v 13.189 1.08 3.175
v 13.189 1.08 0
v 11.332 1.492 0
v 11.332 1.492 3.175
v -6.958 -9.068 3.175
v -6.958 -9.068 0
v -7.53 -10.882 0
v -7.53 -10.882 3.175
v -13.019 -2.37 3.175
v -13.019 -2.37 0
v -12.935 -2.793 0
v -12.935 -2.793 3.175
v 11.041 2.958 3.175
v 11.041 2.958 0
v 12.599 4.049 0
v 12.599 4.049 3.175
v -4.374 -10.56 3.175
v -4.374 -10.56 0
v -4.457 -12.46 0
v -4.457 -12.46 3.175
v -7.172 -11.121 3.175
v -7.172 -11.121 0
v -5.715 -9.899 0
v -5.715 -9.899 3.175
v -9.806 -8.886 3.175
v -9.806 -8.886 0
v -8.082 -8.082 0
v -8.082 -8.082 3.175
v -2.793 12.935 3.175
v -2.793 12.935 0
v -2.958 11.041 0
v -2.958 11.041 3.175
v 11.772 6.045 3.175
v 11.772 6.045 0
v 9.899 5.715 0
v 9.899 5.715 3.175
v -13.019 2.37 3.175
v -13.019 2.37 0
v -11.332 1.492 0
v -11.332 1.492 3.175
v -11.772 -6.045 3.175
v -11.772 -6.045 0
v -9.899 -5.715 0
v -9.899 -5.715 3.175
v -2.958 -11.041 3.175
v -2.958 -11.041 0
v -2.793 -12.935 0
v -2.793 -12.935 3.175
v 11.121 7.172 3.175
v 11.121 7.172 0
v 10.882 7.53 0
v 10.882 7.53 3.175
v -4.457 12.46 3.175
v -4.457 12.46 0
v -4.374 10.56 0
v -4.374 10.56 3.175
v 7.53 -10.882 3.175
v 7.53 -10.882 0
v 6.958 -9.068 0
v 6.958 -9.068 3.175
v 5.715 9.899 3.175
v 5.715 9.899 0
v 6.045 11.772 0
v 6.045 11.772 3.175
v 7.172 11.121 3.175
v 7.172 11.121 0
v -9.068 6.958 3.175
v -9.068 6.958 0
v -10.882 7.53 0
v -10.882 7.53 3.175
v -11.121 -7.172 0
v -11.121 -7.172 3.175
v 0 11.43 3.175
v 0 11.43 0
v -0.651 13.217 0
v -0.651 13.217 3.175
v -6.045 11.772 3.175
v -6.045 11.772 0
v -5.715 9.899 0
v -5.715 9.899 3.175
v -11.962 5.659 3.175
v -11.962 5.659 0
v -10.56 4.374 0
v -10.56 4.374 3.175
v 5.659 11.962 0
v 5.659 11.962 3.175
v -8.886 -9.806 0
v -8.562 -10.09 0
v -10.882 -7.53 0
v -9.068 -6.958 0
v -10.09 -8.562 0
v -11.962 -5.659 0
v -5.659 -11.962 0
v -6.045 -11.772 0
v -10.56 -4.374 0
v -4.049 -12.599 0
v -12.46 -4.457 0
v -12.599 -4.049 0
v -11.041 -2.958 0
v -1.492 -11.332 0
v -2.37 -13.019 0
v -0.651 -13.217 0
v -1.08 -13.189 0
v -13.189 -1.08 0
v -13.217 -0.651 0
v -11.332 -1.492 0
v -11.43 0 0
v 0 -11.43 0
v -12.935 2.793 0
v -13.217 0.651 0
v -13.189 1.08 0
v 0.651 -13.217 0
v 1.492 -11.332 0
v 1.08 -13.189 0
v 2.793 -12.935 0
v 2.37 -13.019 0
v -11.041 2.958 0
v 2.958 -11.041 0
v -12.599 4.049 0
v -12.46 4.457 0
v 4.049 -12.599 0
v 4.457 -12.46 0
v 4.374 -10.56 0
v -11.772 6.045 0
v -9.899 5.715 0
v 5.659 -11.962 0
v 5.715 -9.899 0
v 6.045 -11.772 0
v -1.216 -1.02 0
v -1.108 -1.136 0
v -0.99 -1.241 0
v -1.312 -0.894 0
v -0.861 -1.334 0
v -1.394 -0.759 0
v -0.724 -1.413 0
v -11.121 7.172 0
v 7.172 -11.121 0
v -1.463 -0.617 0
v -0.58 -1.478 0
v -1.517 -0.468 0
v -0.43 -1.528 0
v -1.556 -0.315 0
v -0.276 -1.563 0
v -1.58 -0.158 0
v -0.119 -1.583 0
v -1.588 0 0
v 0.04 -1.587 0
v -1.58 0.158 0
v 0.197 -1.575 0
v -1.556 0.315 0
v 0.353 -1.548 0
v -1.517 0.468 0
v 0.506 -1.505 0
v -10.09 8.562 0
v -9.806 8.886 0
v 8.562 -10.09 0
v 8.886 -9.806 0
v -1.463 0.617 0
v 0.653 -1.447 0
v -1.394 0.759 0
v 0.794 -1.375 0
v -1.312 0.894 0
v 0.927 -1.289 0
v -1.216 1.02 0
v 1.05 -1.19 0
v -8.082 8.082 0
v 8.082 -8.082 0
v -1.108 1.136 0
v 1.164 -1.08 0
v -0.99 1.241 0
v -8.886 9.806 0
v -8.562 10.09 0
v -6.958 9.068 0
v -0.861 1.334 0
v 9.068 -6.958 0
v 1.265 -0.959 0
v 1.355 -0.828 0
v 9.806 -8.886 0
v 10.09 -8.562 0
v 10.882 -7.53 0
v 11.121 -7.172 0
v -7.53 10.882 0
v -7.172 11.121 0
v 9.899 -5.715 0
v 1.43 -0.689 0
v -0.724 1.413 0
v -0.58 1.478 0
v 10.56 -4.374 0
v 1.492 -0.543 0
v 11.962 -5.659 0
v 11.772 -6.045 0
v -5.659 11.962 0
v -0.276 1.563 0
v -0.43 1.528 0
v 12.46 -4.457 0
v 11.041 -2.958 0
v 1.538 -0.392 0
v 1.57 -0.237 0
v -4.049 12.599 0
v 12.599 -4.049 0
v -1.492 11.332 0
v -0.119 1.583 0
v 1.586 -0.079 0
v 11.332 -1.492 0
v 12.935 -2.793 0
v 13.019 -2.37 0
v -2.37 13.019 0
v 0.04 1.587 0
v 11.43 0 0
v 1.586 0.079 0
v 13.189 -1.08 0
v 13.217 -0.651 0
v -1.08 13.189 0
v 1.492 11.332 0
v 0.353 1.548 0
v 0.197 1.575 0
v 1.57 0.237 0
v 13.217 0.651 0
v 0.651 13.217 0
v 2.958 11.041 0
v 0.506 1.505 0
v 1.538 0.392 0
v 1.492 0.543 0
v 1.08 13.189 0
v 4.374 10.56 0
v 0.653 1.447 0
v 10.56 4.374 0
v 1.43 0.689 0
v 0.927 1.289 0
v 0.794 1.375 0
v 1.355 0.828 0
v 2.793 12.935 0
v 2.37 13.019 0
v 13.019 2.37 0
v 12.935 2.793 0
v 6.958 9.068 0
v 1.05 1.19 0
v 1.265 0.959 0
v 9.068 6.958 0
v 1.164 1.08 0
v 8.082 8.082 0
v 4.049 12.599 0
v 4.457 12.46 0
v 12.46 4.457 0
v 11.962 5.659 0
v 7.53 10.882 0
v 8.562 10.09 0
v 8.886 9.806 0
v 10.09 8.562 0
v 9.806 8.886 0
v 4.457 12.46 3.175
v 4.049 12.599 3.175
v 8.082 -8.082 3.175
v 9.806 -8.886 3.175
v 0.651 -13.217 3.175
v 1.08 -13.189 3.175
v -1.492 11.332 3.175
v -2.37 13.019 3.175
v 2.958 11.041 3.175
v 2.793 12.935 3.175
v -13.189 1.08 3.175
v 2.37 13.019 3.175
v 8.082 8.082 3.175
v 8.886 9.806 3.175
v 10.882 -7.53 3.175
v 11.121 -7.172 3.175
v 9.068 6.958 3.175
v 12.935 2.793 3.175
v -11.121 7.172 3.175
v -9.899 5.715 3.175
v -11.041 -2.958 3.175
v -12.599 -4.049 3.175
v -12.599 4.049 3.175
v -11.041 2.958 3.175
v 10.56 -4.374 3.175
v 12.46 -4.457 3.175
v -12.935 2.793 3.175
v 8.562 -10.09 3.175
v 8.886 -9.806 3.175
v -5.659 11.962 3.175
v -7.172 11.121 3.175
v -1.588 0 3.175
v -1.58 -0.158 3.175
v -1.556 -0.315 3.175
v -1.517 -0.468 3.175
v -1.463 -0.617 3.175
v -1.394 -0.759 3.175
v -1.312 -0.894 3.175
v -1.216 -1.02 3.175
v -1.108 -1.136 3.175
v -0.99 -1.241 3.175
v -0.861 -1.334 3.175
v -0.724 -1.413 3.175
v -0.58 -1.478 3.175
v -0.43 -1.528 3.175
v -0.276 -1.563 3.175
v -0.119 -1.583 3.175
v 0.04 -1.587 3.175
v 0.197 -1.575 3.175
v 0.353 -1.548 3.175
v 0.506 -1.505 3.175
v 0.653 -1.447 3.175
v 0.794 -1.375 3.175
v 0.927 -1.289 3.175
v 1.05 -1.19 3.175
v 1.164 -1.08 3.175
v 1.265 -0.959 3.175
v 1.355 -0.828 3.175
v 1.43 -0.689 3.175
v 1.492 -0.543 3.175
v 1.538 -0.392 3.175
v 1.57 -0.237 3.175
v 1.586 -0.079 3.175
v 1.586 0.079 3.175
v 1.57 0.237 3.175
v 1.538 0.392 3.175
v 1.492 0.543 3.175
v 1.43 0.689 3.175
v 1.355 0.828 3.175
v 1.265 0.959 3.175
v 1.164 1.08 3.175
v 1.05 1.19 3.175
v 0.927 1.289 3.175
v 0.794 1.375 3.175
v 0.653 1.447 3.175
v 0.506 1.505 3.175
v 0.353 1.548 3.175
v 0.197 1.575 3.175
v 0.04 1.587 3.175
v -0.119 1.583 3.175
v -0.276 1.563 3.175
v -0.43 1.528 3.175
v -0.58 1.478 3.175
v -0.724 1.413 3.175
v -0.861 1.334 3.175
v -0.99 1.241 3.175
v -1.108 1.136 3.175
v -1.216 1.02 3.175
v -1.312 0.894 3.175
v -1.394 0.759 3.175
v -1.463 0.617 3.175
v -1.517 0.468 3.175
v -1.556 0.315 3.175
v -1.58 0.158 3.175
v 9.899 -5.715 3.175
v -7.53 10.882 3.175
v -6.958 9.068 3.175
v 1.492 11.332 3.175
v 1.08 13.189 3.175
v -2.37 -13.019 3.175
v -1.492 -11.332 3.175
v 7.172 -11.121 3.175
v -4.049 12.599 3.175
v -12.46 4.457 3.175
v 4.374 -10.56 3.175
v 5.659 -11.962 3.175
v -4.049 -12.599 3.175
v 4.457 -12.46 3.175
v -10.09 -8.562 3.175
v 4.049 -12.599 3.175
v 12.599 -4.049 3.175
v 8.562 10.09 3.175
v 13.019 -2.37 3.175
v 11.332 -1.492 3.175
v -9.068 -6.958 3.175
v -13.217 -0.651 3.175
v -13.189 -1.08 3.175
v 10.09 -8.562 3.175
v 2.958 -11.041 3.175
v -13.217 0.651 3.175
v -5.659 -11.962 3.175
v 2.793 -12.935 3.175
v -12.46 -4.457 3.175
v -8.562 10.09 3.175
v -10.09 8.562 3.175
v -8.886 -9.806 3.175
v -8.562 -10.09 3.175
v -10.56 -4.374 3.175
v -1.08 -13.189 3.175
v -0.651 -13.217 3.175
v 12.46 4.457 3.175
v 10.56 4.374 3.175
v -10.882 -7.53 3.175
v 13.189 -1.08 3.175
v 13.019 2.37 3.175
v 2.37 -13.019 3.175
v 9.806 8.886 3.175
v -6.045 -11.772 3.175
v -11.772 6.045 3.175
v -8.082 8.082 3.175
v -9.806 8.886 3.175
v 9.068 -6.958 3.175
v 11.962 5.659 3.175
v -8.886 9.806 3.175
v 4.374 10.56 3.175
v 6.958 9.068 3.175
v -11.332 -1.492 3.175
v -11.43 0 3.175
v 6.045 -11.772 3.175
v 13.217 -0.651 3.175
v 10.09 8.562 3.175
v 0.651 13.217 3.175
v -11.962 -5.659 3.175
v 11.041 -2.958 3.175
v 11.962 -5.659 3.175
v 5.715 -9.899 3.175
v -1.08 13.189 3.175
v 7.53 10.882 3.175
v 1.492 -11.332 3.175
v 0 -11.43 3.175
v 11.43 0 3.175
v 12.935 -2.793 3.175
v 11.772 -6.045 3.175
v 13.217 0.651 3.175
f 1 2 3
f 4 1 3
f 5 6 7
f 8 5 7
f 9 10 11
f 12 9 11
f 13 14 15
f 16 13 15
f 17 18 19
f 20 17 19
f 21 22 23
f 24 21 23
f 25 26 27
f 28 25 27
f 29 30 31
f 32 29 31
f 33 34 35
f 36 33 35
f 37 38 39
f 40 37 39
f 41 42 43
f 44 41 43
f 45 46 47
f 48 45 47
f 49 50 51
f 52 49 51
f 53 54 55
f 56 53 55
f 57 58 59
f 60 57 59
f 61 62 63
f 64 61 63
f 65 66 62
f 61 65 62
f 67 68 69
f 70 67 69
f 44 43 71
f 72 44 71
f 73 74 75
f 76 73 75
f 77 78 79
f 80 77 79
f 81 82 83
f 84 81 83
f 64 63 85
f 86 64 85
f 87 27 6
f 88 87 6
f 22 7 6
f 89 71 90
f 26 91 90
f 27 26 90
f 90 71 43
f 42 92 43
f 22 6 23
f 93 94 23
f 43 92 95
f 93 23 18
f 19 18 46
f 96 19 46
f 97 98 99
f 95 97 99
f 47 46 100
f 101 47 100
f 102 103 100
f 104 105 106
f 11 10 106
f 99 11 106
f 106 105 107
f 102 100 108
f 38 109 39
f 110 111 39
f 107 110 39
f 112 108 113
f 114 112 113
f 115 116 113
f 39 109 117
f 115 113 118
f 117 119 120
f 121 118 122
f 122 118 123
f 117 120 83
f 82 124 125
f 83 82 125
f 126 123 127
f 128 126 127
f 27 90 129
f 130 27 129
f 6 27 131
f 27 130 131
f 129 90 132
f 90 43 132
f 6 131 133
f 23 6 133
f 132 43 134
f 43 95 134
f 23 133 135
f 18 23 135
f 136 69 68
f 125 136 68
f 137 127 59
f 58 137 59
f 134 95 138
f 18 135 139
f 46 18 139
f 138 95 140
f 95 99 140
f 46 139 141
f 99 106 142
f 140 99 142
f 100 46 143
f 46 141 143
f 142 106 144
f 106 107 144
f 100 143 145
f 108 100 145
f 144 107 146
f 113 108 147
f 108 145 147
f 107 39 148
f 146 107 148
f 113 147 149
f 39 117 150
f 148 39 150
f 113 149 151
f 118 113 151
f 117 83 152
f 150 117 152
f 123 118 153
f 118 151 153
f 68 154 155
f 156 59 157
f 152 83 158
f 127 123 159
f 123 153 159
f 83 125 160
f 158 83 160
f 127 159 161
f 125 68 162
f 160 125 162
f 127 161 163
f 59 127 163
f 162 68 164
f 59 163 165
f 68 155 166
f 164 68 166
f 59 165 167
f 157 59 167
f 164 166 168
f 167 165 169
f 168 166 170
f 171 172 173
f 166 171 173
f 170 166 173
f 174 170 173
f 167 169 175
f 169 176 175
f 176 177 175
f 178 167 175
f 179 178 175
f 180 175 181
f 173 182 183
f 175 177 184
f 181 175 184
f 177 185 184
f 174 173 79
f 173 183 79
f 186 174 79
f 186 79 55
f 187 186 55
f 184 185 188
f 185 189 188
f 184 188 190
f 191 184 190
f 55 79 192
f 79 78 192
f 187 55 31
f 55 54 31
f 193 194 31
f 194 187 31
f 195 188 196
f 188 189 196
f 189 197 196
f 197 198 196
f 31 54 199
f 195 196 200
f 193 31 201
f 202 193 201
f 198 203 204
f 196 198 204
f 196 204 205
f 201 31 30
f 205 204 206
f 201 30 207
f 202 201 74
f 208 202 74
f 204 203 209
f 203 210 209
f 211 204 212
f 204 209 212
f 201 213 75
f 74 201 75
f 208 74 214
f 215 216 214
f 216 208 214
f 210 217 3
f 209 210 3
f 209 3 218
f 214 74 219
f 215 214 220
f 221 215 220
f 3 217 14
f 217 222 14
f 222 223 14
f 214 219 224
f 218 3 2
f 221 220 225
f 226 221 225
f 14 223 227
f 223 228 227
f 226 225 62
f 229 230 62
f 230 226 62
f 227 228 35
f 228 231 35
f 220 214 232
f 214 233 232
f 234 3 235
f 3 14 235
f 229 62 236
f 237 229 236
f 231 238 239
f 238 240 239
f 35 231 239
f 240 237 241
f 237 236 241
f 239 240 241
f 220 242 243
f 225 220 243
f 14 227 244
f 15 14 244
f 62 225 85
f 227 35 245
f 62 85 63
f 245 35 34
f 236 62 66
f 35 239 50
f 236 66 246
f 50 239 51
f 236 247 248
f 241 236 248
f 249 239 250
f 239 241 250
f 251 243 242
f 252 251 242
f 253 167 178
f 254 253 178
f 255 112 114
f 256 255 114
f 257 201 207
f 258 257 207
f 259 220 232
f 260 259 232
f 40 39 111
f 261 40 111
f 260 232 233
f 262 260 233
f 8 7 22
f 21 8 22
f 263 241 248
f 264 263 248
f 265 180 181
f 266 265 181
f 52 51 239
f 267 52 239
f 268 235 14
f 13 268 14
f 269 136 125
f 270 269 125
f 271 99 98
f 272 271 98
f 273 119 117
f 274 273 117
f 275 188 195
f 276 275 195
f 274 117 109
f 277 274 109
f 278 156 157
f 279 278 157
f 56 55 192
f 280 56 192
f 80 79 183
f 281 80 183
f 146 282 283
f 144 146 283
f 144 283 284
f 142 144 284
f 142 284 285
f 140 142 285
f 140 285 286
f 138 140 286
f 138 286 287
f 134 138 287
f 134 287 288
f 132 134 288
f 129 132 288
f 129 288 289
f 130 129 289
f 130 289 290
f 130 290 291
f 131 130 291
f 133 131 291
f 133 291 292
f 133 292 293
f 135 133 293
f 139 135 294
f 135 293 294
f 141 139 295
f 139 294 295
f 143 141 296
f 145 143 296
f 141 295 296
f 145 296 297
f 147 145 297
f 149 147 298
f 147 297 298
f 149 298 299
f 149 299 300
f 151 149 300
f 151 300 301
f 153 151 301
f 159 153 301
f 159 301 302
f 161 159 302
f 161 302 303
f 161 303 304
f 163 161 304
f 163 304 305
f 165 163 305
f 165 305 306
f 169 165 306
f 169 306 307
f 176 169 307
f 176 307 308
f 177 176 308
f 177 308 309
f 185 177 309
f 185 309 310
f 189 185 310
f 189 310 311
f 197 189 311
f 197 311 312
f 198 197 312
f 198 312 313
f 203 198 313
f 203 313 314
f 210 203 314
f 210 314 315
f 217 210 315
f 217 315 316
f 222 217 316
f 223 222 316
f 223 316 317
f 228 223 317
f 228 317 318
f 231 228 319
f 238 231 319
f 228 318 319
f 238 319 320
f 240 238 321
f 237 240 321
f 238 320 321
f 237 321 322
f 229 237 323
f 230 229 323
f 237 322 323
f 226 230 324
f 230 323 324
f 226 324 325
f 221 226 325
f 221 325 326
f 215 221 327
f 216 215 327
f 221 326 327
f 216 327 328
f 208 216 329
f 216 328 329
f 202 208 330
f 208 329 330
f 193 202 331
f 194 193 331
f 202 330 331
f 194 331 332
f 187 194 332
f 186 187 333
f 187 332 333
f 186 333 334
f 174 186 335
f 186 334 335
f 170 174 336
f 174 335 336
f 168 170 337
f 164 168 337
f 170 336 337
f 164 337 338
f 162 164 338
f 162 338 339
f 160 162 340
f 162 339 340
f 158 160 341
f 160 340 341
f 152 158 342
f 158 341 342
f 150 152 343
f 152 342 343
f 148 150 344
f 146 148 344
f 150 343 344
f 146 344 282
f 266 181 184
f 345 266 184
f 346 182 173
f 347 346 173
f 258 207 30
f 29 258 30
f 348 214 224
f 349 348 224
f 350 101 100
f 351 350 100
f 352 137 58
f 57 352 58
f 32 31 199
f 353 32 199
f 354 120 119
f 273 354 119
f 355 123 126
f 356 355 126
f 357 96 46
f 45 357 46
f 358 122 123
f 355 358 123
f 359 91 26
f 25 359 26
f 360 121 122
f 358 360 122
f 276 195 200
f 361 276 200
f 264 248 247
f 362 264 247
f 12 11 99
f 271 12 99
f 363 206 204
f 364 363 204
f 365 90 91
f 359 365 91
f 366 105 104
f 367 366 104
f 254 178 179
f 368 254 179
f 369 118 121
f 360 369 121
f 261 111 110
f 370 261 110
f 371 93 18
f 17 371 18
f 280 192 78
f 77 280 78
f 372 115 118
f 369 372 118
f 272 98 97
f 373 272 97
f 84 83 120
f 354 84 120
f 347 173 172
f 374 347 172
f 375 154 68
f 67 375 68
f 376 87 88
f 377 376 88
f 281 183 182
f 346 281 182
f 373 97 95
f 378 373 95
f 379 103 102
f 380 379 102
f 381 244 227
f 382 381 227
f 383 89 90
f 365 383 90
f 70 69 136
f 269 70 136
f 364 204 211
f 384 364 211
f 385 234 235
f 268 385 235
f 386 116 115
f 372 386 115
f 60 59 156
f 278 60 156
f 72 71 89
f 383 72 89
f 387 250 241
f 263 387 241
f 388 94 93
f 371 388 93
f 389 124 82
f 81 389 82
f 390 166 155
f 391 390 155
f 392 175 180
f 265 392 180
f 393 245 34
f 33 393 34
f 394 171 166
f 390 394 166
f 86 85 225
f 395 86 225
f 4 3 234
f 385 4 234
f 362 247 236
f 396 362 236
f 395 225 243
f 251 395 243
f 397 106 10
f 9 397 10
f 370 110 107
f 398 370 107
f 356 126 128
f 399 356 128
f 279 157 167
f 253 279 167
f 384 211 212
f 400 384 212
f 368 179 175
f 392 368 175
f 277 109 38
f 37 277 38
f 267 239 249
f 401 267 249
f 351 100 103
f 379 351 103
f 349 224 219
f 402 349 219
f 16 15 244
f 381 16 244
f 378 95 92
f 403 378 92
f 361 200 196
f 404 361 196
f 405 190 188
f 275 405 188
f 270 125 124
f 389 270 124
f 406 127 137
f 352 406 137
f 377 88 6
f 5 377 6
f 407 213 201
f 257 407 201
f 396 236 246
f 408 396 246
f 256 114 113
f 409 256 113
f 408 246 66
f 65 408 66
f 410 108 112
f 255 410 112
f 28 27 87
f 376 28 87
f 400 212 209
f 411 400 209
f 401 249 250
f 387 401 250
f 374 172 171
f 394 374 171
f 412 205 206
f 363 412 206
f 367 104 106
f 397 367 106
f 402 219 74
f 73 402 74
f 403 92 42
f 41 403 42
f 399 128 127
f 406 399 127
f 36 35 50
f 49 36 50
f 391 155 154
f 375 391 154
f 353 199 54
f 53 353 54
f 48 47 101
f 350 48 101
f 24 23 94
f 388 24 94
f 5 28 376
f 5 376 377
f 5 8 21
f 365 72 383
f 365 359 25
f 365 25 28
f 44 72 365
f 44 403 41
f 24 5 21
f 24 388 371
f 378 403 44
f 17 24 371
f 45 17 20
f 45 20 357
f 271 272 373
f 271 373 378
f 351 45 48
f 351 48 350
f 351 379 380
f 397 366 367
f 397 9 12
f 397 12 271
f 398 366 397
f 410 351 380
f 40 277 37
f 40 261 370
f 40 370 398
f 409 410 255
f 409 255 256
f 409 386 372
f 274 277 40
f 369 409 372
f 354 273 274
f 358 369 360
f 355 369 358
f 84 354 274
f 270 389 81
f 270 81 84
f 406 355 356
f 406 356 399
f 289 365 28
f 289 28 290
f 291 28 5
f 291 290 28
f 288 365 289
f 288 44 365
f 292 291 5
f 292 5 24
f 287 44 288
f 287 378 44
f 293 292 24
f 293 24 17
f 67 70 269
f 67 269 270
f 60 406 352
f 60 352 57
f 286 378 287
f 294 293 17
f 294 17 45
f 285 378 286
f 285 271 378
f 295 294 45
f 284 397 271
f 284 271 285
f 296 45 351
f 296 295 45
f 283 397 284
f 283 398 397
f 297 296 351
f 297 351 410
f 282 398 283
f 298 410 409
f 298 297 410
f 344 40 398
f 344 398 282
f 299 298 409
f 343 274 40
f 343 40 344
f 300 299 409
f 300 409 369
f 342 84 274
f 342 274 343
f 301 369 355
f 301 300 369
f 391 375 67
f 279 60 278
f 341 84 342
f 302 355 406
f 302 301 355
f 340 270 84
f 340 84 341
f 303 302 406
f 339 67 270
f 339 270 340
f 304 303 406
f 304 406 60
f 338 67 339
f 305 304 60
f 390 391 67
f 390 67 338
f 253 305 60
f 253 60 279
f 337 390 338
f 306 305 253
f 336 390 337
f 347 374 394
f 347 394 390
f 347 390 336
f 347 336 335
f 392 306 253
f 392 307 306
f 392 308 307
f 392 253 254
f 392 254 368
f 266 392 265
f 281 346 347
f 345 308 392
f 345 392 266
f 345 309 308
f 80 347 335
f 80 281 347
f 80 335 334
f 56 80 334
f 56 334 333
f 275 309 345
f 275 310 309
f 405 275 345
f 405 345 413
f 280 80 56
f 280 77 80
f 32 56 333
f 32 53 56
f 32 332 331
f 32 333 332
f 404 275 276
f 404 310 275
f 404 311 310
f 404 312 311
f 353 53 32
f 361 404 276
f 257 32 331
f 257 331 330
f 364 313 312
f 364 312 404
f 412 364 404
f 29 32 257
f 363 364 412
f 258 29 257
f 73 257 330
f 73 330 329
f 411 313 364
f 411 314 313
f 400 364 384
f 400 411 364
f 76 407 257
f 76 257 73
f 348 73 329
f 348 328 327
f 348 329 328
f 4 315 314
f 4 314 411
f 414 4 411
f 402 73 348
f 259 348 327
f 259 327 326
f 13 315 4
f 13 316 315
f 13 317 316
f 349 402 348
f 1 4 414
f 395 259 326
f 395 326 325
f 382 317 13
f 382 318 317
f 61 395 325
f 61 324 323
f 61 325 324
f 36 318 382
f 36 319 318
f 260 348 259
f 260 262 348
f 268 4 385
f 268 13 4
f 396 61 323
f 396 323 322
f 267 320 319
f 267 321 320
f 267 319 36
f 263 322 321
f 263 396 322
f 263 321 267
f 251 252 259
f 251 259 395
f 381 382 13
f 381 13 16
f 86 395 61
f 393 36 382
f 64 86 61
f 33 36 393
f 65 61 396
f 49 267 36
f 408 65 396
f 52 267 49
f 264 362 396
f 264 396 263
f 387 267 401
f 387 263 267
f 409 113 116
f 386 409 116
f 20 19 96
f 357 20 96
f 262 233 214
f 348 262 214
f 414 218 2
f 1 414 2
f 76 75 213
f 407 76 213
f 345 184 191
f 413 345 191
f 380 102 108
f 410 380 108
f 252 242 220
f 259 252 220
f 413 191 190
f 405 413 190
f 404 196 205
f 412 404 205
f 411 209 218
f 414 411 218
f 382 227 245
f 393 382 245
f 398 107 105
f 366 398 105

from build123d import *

# Parameters (mm, degrees)
F2_DEPTH = 3.175
F3_D     = 3.175


with BuildPart() as f2:
    # F1 (on Top) → F2 (new body)
    with BuildSketch(Plane.XY):
        Polygon((0.65056, 13.217399), (0, 11.43), (-0.65056, 13.217399), (-1.080222, 13.189238), (-1.491914, 11.332215), (-2.370211, 13.019408), (-2.792522, 12.935405), (-2.958302, 11.040532), (-4.049308, 12.59865), (-4.457041, 12.460243), (-4.374072, 10.559943), (-5.659119, 11.962326), (-6.045298, 11.771884), (-5.715, 9.89867), (-7.172101, 11.121324), (-7.530119, 10.882104), (-6.958143, 9.068029), (-8.562367, 10.090032), (-8.886097, 9.806128), (-8.082231, 8.082231), (-9.806128, 8.886097), (-10.090032, 8.562367), (-9.068029, 6.958143), (-10.882104, 7.530119), (-11.121324, 7.172101), (-9.89867, 5.715), (-11.771884, 6.045298), (-11.962326, 5.659119), (-10.559943, 4.374072), (-12.460243, 4.457041), (-12.59865, 4.049308), (-11.040532, 2.958302), (-12.935405, 2.792522), (-13.019408, 2.370211), (-11.332215, 1.491914), (-13.189238, 1.080222), (-13.217399, 0.65056), (-11.43, 0), (-13.217399, -0.65056), (-13.189238, -1.080222), (-11.332215, -1.491914), (-13.019408, -2.370211), (-12.935405, -2.792522), (-11.040532, -2.958302), (-12.59865, -4.049308), (-12.460243, -4.457041), (-10.559943, -4.374072), (-11.962326, -5.659119), (-11.771884, -6.045298), (-9.89867, -5.715), (-11.121324, -7.172101), (-10.882104, -7.530119), (-9.068029, -6.958143), (-10.090032, -8.562367), (-9.806128, -8.886097), (-8.082231, -8.082231), (-8.886097, -9.806128), (-8.562367, -10.090032), (-6.958143, -9.068029), (-7.530119, -10.882104), (-7.172101, -11.121324), (-5.715, -9.89867), (-6.045298, -11.771884), (-5.659119, -11.962326), (-4.374072, -10.559943), (-4.457041, -12.460243), (-4.049308, -12.59865), (-2.958302, -11.040532), (-2.792522, -12.935405), (-2.370211, -13.019408), (-1.491914, -11.332215), (-1.080222, -13.189238), (-0.65056, -13.217399), (0, -11.43), (0.65056, -13.217399), (1.080222, -13.189238), (1.491914, -11.332215), (2.370211, -13.019408), (2.792522, -12.935405), (2.958302, -11.040532), (4.049308, -12.59865), (4.457041, -12.460243), (4.374072, -10.559943), (5.659119, -11.962326), (6.045298, -11.771884), (5.715, -9.89867), (7.172101, -11.121324), (7.530119, -10.882104), (6.958143, -9.068029), (8.562367, -10.090032), (8.886097, -9.806128), (8.082231, -8.082231), (9.806128, -8.886097), (10.090032, -8.562367), (9.068029, -6.958143), (10.882104, -7.530119), (11.121324, -7.172101), (9.89867, -5.715), (11.771884, -6.045298), (11.962326, -5.659119), (10.559943, -4.374072), (12.460243, -4.457041), (12.59865, -4.049308), (11.040532, -2.958302), (12.935405, -2.792522), (13.019408, -2.370211), (11.332215, -1.491914), (13.189238, -1.080222), (13.217399, -0.65056), (11.43, 0), (13.217399, 0.65056), (13.189238, 1.080222), (11.332215, 1.491914), (13.019408, 2.370211), (12.935405, 2.792522), (11.040532, 2.958302), (12.59865, 4.049308), (12.460243, 4.457041), (10.559943, 4.374072), (11.962326, 5.659119), (11.771884, 6.045298), (9.89867, 5.715), (11.121324, 7.172101), (10.882104, 7.530119), (9.068029, 6.958143), (10.090032, 8.562367), (9.806128, 8.886097), (8.082231, 8.082231), (8.886097, 9.806128), (8.562367, 10.090032), (6.958143, 9.068029), (7.530119, 10.882104), (7.172101, 11.121324), (5.715, 9.89867), (6.045298, 11.771884), (5.659119, 11.962326), (4.374072, 10.559943), (4.457041, 12.460243), (4.049308, 12.59865), (2.958302, 11.040532), (2.792522, 12.935405), (2.370211, 13.019408), (1.491914, 11.332215), (1.080222, 13.189238), align=None)
    extrude(amount=F2_DEPTH)

    # F3 (through all)
    with Locations(Plane(origin=(0, 0, 0), x_dir=(1, 0, 0), z_dir=(0, 0, -1))):
        with Locations((0, 0)):
            Hole(F3_D / 2)


solid = f2.part
